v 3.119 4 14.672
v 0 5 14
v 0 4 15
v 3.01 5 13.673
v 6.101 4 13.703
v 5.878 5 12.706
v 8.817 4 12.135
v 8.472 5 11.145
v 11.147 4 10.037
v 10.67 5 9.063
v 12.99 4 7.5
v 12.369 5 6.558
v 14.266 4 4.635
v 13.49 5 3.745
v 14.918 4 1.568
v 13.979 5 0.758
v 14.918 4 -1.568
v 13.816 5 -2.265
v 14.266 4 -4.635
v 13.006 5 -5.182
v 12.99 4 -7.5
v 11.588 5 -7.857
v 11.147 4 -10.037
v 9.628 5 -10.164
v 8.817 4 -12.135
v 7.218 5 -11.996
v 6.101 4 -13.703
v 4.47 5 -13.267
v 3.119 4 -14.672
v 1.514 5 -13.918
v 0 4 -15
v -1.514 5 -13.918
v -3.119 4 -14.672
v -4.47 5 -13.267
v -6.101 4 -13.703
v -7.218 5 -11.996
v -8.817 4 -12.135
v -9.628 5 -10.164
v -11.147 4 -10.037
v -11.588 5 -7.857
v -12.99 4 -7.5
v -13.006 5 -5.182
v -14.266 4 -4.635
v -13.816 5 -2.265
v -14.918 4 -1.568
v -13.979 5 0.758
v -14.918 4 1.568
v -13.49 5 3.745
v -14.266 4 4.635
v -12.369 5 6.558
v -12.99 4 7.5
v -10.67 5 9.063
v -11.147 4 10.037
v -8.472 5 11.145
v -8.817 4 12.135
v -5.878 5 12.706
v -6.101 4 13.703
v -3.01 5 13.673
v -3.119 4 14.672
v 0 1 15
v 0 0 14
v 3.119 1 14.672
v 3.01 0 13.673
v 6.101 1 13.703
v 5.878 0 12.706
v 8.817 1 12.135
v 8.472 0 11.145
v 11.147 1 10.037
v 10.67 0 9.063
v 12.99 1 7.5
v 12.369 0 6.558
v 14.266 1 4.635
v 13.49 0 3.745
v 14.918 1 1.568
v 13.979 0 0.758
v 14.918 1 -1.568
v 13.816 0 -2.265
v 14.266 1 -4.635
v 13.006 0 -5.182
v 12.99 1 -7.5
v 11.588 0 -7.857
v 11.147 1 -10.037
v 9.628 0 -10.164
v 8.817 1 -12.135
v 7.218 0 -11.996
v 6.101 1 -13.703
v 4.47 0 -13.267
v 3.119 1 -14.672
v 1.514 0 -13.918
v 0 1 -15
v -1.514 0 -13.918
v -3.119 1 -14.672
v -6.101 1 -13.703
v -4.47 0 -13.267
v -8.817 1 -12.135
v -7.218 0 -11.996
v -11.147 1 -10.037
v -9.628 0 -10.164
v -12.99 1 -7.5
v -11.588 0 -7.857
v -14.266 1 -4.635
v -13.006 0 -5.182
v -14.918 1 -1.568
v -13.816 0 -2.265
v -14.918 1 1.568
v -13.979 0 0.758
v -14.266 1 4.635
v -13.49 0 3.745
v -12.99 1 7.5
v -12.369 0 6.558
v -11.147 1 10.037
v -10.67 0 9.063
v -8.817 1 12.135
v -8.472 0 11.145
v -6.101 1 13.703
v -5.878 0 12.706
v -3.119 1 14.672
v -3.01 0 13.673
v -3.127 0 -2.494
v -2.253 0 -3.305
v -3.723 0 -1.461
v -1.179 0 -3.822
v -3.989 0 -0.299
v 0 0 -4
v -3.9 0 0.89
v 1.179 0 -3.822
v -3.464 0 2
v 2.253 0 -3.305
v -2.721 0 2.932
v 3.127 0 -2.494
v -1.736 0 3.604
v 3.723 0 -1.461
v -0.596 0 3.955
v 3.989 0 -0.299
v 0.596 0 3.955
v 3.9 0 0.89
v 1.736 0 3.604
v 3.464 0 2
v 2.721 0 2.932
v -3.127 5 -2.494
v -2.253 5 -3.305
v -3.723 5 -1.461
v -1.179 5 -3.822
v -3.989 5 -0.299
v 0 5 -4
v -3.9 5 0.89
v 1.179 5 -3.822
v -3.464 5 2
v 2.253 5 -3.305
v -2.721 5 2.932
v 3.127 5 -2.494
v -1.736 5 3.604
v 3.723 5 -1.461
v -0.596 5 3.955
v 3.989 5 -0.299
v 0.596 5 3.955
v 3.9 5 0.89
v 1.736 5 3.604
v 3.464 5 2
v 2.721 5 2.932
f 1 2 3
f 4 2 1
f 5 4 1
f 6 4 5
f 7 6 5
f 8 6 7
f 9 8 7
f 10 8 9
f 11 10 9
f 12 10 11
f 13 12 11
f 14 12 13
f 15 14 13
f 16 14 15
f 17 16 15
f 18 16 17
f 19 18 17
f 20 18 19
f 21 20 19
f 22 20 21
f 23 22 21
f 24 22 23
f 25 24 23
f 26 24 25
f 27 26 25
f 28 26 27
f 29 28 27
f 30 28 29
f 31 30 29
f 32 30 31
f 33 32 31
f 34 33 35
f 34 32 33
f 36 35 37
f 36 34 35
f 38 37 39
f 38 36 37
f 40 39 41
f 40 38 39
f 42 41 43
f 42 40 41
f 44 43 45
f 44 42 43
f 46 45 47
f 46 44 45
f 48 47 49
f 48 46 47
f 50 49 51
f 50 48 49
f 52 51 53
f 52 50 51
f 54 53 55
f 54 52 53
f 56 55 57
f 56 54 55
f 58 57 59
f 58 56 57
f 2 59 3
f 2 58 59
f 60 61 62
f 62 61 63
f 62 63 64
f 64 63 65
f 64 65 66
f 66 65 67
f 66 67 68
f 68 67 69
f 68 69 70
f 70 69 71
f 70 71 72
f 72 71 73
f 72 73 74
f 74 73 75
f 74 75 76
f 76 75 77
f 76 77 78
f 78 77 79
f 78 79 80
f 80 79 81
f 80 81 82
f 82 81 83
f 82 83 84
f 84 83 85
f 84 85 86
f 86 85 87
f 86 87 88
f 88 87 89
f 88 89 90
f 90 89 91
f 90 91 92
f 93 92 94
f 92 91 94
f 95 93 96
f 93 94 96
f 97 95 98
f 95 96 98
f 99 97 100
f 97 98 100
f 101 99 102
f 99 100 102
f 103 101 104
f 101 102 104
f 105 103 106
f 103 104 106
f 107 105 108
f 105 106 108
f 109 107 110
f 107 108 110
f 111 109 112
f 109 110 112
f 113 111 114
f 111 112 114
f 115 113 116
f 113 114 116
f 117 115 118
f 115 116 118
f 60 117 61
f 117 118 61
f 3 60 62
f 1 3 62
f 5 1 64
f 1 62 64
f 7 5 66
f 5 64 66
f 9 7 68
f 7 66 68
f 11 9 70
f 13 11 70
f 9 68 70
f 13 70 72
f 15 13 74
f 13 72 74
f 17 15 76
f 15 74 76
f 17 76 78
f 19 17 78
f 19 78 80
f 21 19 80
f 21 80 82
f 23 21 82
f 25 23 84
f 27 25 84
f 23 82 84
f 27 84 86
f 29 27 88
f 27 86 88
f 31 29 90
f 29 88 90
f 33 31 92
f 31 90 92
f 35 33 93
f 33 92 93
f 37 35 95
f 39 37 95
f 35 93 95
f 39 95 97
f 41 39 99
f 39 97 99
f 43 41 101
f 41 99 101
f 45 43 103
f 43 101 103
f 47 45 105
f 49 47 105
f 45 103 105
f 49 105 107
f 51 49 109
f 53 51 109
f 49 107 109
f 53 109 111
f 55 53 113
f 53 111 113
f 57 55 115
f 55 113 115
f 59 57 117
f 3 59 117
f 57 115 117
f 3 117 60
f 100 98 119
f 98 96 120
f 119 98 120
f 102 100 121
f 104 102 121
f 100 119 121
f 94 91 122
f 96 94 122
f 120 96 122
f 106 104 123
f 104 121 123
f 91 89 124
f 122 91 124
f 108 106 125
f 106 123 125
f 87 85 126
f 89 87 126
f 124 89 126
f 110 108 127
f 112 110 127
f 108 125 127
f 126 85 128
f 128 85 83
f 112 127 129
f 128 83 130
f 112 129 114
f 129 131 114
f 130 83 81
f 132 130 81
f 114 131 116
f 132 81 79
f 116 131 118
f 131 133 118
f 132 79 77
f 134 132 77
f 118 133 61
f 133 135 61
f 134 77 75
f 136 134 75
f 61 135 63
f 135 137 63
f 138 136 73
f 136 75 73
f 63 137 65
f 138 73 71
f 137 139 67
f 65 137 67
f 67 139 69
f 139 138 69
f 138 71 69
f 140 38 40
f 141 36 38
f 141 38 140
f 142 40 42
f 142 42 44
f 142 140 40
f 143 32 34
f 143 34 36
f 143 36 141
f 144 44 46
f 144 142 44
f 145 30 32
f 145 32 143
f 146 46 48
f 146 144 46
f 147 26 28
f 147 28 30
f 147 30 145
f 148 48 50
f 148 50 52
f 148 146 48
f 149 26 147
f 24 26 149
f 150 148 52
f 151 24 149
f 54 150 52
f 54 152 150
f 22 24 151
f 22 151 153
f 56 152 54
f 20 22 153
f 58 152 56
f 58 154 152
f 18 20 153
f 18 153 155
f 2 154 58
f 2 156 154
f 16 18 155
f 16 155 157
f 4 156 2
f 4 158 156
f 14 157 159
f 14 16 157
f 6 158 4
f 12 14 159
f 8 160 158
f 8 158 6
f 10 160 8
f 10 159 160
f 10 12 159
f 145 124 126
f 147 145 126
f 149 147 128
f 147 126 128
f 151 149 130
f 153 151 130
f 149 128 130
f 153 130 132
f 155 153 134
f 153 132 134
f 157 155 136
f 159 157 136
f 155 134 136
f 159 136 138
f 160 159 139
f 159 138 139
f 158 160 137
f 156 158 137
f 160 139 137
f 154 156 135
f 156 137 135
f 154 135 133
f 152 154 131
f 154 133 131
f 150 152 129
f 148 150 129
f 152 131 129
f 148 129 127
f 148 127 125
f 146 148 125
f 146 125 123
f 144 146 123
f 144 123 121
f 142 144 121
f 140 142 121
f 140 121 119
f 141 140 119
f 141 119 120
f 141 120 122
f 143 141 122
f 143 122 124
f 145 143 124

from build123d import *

# Parameters (mm, degrees)
SKETCH_1_R          = 15
EXTRUDE_1_DEPTH     = 5
CHAMFER_1_SIZE      = 1
SKETCH_2_R          = 4
CUT_EXTRUDE_1_DEPTH = 22.794494718


with BuildPart() as part:
    # 草图1 → 凸台-拉伸1 (new body)
    with BuildSketch(Plane(origin=(0, 0, 0), x_dir=(1, 0, 0), z_dir=(0, 1, 0))):
        with Locations(Location((0, 0, 0), (0, 0, 270))):
            Circle(SKETCH_1_R)
    extrude(amount=EXTRUDE_1_DEPTH)

    # 倒角1
    chamfer_1_edges = [part.edges().sort_by_distance(p)[0] for p in [
        (0, 0, -15),
        (0, 5, -15),
    ]]
    chamfer(chamfer_1_edges, length=CHAMFER_1_SIZE)

    # 草图2 → 切除-拉伸1 (cut, through all)
    with BuildSketch(Plane.XZ):
        with Locations(Location((0, 0, 0), (0, 0, 270))):
            Circle(SKETCH_2_R)
    extrude(amount=-CUT_EXTRUDE_1_DEPTH, mode=Mode.SUBTRACT)


solid = part.part
